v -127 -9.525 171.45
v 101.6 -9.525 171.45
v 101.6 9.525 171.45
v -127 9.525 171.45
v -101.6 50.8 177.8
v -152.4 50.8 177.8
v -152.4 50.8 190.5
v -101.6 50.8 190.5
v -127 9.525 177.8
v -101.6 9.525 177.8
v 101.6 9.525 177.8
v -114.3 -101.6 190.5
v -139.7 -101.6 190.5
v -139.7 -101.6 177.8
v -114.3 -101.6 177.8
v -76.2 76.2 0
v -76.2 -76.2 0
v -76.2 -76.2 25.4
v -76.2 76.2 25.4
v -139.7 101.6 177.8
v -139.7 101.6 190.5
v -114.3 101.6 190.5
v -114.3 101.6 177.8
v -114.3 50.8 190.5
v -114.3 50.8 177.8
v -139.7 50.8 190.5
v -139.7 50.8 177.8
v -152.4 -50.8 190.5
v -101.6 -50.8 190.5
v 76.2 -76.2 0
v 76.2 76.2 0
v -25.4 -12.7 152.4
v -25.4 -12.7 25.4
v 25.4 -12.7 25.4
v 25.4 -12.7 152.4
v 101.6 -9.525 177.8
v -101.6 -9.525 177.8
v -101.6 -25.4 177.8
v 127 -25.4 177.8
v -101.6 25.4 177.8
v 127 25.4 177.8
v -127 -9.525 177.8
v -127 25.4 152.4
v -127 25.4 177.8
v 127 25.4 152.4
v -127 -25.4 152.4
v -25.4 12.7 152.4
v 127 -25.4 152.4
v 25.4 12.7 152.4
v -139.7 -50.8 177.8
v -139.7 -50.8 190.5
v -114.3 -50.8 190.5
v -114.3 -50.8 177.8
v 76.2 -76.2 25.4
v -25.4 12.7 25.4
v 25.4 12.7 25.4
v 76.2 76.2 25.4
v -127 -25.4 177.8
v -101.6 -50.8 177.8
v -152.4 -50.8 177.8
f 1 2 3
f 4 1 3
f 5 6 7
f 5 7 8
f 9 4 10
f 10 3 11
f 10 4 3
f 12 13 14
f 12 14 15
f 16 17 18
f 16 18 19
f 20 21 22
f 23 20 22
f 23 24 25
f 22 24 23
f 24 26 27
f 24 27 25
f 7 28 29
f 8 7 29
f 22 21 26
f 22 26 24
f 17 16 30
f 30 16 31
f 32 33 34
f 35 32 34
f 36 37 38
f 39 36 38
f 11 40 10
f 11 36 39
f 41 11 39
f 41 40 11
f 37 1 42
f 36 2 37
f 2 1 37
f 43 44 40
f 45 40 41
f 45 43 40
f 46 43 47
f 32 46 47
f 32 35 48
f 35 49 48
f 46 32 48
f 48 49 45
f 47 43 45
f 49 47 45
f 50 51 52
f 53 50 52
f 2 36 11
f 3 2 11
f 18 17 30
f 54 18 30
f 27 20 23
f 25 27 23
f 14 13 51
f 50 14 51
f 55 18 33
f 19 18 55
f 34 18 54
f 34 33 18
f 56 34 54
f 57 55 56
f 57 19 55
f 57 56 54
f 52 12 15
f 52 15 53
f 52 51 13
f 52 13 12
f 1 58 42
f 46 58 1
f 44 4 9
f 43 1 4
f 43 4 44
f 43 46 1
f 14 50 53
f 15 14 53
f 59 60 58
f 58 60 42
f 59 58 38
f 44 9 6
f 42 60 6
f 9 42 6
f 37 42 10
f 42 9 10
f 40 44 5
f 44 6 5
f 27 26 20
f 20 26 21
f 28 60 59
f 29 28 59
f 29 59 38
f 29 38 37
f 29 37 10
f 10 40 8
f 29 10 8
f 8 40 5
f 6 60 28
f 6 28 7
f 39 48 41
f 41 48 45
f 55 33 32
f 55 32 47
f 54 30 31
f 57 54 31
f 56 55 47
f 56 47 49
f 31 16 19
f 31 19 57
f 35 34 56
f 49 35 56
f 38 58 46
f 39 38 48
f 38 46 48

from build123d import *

# Parameters (mm, degrees)
F0_W      = 152.4
F0_H      = 152.4
F1_DEPTH  = 25.4
F2_W      = 50.8
F2_H      = 25.4
F3_DEPTH  = 152.4
F4_W      = 254
F4_H      = 50.8
F5_DEPTH  = 25.4
F6_W      = 50.8
F6_H      = 101.6
F7_DEPTH  = 12.7
F8_W      = 203.2
F8_H      = 19.05
F9_DEPTH  = 6.35
F10_W     = 25.4
F10_H     = 50.8
F11_DEPTH = 12.7
F12_W     = 19.05
F12_H     = 6.35
F13_DEPTH = 50.8


with BuildPart() as f1:
    # F0 (on Top) → F1 (new body)
    with BuildSketch(Plane.XY):
        Rectangle(F0_W, F0_H)
    extrude(amount=F1_DEPTH)

    # F2 (on Top) → F3 (join)
    with BuildSketch(Plane.XY):
        Rectangle(F2_W, F2_H)
    extrude(amount=F3_DEPTH)

    # F4 (on face) → F5 (join)
    with BuildSketch(Plane.XY.offset(152.4)):
        Rectangle(F4_W, F4_H)
    extrude(amount=F5_DEPTH)

    # F6 (on face) → F7 (join)
    with BuildSketch(Plane.XY.offset(177.8)):
        with Locations((-127, 0)):
            Rectangle(F6_W, F6_H)
    extrude(amount=F7_DEPTH)

    # F8 (on face) → F9 (cut)
    with BuildSketch(Plane.XY.offset(177.8)):
        Rectangle(F8_W, F8_H)
    extrude(amount=-F9_DEPTH, mode=Mode.SUBTRACT)

    # F12 (on face) → F13 (cut)
    with BuildSketch(Plane.YZ.offset(-101.6)):
        with Locations((0, 174.625)):
            Rectangle(F12_W, F12_H)
    extrude(amount=-F13_DEPTH, mode=Mode.SUBTRACT)


with BuildPart() as f11:
    # F10 (on face) → F11 (new body)
    with BuildSketch(Plane.XY.offset(190.5)):
        with Locations((-127, -76.2)):
            Rectangle(F10_W, F10_H)
        with Locations((-127, 76.2)):
            Rectangle(F10_W, F10_H)
    extrude(amount=-F11_DEPTH)


solid = Compound([f1.part, f11.part])
